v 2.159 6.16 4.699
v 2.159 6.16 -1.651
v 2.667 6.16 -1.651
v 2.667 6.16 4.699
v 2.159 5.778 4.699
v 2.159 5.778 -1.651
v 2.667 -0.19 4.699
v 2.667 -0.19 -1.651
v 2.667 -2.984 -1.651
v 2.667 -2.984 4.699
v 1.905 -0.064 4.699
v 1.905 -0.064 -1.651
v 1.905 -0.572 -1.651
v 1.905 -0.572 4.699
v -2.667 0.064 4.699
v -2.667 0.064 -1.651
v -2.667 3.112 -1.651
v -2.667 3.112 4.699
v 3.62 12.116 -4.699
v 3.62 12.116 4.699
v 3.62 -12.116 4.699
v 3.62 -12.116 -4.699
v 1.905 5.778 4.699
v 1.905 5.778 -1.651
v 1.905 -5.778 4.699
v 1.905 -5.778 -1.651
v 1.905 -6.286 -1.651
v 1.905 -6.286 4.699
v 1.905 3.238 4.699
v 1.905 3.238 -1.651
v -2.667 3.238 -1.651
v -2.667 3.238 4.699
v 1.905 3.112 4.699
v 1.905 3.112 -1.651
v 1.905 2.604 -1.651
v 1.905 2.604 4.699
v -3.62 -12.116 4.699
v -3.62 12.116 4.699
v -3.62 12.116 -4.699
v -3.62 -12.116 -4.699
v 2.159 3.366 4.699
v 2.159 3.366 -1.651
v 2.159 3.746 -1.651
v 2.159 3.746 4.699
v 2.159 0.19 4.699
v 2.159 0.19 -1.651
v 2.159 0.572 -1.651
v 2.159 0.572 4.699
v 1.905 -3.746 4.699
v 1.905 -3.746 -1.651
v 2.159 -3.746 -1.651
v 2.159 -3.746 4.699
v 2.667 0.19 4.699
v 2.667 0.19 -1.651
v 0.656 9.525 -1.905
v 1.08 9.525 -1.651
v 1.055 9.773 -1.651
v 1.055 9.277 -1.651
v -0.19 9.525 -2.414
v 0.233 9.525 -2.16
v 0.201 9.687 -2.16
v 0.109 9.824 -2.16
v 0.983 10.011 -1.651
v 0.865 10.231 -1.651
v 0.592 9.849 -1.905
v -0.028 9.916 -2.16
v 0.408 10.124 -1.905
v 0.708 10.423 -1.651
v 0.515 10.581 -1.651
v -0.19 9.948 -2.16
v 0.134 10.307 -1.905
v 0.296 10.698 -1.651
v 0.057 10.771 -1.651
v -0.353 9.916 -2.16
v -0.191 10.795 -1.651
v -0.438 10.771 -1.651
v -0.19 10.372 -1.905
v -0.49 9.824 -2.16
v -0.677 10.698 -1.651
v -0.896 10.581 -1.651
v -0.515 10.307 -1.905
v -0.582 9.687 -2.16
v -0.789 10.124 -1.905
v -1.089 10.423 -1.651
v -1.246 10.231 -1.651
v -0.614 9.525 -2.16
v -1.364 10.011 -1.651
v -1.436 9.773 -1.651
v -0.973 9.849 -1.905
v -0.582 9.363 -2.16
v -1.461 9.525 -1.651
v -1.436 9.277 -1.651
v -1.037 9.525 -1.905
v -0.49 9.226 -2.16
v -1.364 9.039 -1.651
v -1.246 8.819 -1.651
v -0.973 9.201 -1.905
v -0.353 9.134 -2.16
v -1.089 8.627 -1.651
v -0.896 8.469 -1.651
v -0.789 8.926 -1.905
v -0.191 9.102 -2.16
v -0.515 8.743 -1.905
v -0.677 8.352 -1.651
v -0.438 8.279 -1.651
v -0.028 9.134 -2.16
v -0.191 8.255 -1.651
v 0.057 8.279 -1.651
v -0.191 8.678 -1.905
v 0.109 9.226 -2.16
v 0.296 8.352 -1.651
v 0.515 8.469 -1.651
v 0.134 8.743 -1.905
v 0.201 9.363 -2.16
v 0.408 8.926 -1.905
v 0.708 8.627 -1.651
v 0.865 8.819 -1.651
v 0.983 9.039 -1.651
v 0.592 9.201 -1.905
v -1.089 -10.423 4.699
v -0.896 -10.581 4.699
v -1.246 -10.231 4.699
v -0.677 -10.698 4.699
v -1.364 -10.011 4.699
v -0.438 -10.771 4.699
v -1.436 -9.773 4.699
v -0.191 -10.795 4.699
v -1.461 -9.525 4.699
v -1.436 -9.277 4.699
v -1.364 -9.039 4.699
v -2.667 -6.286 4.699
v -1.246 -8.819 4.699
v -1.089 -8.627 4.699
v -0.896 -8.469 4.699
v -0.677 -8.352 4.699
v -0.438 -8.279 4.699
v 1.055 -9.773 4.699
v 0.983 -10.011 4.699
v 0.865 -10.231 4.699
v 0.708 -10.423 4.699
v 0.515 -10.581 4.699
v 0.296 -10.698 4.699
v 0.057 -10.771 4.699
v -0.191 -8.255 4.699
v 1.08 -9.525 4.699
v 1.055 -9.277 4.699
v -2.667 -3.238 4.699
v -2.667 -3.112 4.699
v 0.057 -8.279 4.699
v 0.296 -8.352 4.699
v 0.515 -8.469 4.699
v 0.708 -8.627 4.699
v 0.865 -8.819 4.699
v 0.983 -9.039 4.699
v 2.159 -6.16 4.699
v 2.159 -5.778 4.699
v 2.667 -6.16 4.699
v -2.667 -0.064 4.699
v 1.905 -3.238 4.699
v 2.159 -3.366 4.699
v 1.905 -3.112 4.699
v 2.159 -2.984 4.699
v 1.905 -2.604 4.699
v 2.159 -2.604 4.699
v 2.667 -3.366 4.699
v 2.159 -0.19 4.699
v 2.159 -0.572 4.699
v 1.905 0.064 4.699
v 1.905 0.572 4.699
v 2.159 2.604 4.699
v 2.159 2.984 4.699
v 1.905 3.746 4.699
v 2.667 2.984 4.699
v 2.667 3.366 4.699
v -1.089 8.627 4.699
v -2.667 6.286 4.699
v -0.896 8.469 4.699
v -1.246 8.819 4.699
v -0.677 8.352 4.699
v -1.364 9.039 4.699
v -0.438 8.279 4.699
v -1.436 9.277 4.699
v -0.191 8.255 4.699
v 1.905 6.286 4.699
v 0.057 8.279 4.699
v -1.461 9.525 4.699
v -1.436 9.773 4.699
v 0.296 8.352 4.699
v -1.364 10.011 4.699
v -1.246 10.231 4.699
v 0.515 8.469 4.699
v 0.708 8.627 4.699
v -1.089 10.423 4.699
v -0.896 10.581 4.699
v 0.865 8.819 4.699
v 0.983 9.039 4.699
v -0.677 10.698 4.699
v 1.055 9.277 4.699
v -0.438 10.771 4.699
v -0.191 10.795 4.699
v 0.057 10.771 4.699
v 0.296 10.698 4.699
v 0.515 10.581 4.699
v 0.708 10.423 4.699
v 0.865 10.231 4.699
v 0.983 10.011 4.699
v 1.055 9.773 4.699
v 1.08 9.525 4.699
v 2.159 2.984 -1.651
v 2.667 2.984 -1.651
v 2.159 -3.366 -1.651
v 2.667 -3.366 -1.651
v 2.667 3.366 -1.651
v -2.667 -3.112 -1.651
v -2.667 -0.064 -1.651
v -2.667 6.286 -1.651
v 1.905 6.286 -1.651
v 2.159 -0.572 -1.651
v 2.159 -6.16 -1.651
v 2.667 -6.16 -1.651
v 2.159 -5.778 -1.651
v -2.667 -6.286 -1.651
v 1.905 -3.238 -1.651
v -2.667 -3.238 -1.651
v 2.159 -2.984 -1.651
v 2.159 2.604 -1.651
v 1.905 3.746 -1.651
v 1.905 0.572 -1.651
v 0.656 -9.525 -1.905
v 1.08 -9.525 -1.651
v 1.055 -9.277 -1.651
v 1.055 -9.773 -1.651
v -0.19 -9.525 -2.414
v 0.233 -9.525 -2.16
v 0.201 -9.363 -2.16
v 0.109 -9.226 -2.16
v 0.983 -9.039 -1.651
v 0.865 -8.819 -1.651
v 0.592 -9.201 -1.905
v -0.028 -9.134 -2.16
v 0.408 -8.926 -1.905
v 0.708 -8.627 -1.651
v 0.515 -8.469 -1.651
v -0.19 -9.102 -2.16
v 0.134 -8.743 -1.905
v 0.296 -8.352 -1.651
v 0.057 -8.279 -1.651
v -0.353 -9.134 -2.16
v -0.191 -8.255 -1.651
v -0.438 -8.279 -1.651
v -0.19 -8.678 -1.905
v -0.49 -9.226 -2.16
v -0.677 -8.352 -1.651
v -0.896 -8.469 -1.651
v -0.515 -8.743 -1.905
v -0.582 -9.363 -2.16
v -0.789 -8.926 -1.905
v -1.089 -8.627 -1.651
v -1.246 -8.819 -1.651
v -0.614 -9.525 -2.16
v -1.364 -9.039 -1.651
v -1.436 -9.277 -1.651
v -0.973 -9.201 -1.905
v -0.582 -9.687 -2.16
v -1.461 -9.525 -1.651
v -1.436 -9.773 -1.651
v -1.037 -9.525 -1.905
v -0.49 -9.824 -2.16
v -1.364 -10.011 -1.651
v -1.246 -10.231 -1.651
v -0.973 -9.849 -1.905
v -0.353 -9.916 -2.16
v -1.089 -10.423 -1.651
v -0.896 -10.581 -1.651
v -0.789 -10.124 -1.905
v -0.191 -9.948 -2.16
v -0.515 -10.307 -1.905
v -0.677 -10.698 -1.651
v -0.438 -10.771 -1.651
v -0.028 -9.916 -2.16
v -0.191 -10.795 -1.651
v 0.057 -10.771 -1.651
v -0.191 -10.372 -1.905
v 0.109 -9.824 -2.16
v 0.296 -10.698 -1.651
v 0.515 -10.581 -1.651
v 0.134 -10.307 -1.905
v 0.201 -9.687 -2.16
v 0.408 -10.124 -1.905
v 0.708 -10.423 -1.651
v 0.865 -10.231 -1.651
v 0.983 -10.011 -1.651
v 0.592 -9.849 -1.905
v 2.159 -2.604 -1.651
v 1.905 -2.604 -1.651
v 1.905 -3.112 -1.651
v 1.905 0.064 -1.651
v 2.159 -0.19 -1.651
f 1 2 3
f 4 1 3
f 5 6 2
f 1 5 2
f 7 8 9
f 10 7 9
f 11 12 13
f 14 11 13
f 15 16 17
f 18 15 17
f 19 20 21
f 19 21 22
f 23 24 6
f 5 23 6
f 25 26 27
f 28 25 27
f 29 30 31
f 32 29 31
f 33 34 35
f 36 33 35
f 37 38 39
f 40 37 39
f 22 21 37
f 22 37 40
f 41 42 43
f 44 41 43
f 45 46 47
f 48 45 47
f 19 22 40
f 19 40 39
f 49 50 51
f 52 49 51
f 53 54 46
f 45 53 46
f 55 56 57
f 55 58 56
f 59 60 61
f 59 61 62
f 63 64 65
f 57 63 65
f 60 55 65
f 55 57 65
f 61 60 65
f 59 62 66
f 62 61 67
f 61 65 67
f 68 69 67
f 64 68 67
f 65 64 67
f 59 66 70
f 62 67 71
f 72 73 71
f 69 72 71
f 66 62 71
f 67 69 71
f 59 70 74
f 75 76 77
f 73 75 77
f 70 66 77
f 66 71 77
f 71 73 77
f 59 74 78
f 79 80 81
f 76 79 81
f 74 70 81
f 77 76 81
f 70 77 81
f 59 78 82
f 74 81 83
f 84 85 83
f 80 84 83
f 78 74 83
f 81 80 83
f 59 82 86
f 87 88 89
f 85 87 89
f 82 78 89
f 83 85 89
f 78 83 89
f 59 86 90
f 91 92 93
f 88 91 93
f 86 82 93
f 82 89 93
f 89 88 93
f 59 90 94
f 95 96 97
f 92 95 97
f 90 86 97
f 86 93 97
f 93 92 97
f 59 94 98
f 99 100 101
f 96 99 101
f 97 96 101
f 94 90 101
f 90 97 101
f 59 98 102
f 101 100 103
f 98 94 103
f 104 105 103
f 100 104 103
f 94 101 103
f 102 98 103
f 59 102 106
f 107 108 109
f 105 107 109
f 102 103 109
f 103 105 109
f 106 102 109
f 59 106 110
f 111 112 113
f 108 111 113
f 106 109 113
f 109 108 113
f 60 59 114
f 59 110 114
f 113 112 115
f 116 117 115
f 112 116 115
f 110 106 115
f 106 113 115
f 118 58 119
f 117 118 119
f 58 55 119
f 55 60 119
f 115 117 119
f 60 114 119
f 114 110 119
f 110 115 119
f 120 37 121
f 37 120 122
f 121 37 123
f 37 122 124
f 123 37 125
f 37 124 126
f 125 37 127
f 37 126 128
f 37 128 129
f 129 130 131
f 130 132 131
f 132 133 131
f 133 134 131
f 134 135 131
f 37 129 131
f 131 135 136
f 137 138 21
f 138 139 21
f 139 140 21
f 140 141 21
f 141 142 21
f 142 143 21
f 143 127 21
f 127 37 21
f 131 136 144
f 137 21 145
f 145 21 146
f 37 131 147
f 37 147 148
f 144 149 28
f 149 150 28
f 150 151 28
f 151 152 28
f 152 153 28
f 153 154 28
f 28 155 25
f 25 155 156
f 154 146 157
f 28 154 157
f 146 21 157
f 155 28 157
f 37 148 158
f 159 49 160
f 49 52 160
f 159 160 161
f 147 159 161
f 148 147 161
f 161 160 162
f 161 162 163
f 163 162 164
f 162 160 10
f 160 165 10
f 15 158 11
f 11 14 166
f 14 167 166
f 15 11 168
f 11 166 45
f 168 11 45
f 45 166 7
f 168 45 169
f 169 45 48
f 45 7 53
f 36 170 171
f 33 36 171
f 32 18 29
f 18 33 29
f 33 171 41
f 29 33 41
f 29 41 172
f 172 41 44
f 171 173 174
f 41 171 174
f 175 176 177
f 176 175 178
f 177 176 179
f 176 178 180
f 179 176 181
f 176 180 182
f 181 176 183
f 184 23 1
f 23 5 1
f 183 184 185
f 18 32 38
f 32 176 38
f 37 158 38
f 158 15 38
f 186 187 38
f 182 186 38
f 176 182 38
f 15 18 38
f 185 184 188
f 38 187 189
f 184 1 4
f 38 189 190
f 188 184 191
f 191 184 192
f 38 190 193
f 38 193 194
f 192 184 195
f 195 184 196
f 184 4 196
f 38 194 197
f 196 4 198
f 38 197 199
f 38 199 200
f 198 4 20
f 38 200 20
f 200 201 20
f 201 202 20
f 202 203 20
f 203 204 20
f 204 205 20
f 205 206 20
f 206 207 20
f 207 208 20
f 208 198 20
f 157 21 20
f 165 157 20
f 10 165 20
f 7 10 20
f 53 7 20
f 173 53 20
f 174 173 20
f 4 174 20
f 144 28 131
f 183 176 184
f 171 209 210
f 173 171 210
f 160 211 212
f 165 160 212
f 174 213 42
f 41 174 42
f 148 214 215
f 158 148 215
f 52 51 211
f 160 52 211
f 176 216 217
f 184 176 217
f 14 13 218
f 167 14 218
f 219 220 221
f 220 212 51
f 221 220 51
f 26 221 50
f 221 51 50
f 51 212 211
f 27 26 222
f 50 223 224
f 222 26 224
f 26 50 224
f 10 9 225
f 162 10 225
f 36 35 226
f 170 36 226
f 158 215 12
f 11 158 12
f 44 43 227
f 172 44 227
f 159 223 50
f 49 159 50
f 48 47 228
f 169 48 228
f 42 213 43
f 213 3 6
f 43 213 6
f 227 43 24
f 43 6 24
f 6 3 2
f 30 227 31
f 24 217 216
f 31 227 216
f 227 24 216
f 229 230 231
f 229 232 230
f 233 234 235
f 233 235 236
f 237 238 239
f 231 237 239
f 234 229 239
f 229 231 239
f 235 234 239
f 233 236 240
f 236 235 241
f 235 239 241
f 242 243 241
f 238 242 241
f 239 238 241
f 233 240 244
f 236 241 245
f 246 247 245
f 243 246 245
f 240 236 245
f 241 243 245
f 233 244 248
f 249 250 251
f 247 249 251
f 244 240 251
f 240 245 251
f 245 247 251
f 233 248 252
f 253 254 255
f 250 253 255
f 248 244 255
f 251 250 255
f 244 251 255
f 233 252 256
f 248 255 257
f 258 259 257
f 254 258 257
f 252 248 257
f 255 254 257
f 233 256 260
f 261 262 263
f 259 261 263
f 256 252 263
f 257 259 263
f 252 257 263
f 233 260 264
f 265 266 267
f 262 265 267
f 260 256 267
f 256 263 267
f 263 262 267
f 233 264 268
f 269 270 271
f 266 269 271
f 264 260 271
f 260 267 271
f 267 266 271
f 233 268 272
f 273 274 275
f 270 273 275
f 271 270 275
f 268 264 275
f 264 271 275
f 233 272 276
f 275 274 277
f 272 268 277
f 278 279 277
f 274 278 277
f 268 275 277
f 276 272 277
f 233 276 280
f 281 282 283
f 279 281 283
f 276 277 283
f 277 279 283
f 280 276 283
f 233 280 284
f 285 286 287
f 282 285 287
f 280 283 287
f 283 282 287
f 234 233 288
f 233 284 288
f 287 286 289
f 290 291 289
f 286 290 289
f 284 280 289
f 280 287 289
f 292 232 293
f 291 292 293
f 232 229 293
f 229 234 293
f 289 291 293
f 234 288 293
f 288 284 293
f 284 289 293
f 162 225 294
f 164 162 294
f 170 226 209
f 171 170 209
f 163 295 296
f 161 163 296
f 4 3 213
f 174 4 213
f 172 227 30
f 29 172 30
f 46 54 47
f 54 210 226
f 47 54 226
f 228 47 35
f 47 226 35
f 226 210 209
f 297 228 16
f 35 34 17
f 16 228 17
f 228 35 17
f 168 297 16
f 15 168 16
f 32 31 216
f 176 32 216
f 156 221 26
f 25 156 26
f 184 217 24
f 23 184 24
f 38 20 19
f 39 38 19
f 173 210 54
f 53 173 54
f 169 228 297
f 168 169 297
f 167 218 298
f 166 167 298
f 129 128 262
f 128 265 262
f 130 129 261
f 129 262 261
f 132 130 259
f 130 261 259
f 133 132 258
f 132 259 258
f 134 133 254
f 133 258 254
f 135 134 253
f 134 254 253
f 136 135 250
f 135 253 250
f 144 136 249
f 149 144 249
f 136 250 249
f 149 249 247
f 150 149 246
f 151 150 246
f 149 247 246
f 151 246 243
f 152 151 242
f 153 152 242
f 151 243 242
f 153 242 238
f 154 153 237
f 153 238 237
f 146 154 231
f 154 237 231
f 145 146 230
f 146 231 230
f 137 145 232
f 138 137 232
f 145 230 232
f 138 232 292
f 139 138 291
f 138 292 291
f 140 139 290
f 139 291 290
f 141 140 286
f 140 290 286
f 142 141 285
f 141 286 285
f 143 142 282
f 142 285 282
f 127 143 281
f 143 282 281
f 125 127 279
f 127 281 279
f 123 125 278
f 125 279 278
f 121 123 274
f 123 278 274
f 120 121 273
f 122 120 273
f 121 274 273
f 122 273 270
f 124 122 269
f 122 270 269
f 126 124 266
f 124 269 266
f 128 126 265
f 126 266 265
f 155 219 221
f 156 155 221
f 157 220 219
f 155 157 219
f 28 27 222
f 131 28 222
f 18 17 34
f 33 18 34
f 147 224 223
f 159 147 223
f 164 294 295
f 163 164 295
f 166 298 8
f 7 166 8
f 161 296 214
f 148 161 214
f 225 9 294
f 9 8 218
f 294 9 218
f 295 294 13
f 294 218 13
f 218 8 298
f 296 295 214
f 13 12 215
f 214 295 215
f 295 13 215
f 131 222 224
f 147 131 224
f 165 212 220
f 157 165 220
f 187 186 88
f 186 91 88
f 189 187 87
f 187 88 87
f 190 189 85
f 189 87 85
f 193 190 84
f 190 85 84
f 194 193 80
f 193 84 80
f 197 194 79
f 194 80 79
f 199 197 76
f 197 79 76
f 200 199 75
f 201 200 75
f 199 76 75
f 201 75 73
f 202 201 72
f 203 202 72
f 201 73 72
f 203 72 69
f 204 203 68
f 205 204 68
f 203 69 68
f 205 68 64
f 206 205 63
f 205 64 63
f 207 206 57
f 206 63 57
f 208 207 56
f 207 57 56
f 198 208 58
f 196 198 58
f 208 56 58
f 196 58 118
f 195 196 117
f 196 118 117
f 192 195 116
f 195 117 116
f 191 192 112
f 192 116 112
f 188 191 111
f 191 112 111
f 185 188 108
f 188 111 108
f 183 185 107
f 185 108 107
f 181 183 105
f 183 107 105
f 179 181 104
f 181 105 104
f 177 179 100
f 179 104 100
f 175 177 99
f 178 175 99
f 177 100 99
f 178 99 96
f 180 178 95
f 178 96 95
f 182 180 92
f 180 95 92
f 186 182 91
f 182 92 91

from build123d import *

# Parameters (mm, degrees)
SKETCH1_W           = 9.398
SKETCH1_H           = 24.2316
BOSS_EXTRUDE1_DEPTH = 7.239
HOLE1_D             = 2.54
HOLE1_DEPTH         = 6.35
HOLE1_TIP           = 0.763092986
CUT_EXTRUDE1_REACH  = 16.15


with BuildPart() as part:
    # Sketch1 → Boss-Extrude1 (new body)
    with BuildSketch(Plane(origin=(3.6195, 0, 0), x_dir=(0, 0, -1), z_dir=(1, 0, 0))):
        Rectangle(SKETCH1_W, SKETCH1_H)
    extrude(amount=-BOSS_EXTRUDE1_DEPTH)

    # Hole1
    with Locations(Plane.XY.offset(4.699)):
        with Locations((-0.1905, -9.525), (-0.1905, 9.525)):
            Hole(HOLE1_D / 2, depth=HOLE1_DEPTH)
            with Locations((0, 0, -(HOLE1_DEPTH + HOLE1_TIP / 2))):  # 118° drill point
                Cone(0, HOLE1_D / 2, HOLE1_TIP, mode=Mode.SUBTRACT)

    # Sketch4 → Cut-Extrude1 (cut, up to next)
    with BuildSketch(Plane(origin=(0, 0, -1.651), x_dir=(-1, 0, 0), z_dir=(0, 0, -1)), mode=Mode.PRIVATE) as cut_extrude1_sk1:
        Polygon((2.667, 6.2865), (-1.905, 6.2865), (-1.905, 5.7785), (-2.159, 5.7785), (-2.159, 6.1595), (-2.667, 6.1595), (-2.667, 3.3655), (-2.159, 3.3655), (-2.159, 3.7465), (-1.905, 3.7465), (-1.905, 3.2385), (2.667, 3.2385), align=None)
    cut_extrude1_tool1 = extrude(cut_extrude1_sk1.sketch, amount=-CUT_EXTRUDE1_REACH, mode=Mode.PRIVATE) & part.part
    # Sketch4 → Cut-Extrude1 (cut, up to next)
    with BuildSketch(Plane(origin=(0, 0, -1.651), x_dir=(-1, 0, 0), z_dir=(0, 0, -1)), mode=Mode.PRIVATE) as cut_extrude1_sk2:
        Polygon((2.667, 3.1115), (-1.905, 3.1115), (-1.905, 2.6035), (-2.159, 2.6035), (-2.159, 2.9845), (-2.667, 2.9845), (-2.667, 0.1905), (-2.159, 0.1905), (-2.159, 0.5715), (-1.905, 0.5715), (-1.905, 0.0635), (2.667, 0.0635), align=None)
    cut_extrude1_tool2 = extrude(cut_extrude1_sk2.sketch, amount=-CUT_EXTRUDE1_REACH, mode=Mode.PRIVATE) & part.part
    # Sketch4 → Cut-Extrude1 (cut, up to next)
    with BuildSketch(Plane(origin=(0, 0, -1.651), x_dir=(-1, 0, 0), z_dir=(0, 0, -1)), mode=Mode.PRIVATE) as cut_extrude1_sk3:
        Polygon((2.667, -0.0635), (-1.905, -0.0635), (-1.905, -0.5715), (-2.159, -0.5715), (-2.159, -0.1905), (-2.667, -0.1905), (-2.667, -2.9845), (-2.159, -2.9845), (-2.159, -2.6035), (-1.905, -2.6035), (-1.905, -3.1115), (2.667, -3.1115), align=None)
    cut_extrude1_tool3 = extrude(cut_extrude1_sk3.sketch, amount=-CUT_EXTRUDE1_REACH, mode=Mode.PRIVATE) & part.part
    # Sketch4 → Cut-Extrude1 (cut, up to next)
    with BuildSketch(Plane(origin=(0, 0, -1.651), x_dir=(-1, 0, 0), z_dir=(0, 0, -1)), mode=Mode.PRIVATE) as cut_extrude1_sk4:
        Polygon((2.667, -3.2385), (-1.905, -3.2385), (-1.905, -3.7465), (-2.159, -3.7465), (-2.159, -3.3655), (-2.667, -3.3655), (-2.667, -6.1595), (-2.159, -6.1595), (-2.159, -5.7785), (-1.905, -5.7785), (-1.905, -6.2865), (2.667, -6.2865), align=None)
    cut_extrude1_tool4 = extrude(cut_extrude1_sk4.sketch, amount=-CUT_EXTRUDE1_REACH, mode=Mode.PRIVATE) & part.part
    add(cut_extrude1_tool1.solids().sort_by_distance((-0.052659, 4.7625, -1.651))[0], mode=Mode.SUBTRACT)
    add(cut_extrude1_tool2.solids().sort_by_distance((-0.052659, 1.5875, -1.651))[0], mode=Mode.SUBTRACT)
    add(cut_extrude1_tool3.solids().sort_by_distance((-0.052659, -1.5875, -1.651))[0], mode=Mode.SUBTRACT)
    add(cut_extrude1_tool4.solids().sort_by_distance((-0.052659, -4.7625, -1.651))[0], mode=Mode.SUBTRACT)


solid = part.part
